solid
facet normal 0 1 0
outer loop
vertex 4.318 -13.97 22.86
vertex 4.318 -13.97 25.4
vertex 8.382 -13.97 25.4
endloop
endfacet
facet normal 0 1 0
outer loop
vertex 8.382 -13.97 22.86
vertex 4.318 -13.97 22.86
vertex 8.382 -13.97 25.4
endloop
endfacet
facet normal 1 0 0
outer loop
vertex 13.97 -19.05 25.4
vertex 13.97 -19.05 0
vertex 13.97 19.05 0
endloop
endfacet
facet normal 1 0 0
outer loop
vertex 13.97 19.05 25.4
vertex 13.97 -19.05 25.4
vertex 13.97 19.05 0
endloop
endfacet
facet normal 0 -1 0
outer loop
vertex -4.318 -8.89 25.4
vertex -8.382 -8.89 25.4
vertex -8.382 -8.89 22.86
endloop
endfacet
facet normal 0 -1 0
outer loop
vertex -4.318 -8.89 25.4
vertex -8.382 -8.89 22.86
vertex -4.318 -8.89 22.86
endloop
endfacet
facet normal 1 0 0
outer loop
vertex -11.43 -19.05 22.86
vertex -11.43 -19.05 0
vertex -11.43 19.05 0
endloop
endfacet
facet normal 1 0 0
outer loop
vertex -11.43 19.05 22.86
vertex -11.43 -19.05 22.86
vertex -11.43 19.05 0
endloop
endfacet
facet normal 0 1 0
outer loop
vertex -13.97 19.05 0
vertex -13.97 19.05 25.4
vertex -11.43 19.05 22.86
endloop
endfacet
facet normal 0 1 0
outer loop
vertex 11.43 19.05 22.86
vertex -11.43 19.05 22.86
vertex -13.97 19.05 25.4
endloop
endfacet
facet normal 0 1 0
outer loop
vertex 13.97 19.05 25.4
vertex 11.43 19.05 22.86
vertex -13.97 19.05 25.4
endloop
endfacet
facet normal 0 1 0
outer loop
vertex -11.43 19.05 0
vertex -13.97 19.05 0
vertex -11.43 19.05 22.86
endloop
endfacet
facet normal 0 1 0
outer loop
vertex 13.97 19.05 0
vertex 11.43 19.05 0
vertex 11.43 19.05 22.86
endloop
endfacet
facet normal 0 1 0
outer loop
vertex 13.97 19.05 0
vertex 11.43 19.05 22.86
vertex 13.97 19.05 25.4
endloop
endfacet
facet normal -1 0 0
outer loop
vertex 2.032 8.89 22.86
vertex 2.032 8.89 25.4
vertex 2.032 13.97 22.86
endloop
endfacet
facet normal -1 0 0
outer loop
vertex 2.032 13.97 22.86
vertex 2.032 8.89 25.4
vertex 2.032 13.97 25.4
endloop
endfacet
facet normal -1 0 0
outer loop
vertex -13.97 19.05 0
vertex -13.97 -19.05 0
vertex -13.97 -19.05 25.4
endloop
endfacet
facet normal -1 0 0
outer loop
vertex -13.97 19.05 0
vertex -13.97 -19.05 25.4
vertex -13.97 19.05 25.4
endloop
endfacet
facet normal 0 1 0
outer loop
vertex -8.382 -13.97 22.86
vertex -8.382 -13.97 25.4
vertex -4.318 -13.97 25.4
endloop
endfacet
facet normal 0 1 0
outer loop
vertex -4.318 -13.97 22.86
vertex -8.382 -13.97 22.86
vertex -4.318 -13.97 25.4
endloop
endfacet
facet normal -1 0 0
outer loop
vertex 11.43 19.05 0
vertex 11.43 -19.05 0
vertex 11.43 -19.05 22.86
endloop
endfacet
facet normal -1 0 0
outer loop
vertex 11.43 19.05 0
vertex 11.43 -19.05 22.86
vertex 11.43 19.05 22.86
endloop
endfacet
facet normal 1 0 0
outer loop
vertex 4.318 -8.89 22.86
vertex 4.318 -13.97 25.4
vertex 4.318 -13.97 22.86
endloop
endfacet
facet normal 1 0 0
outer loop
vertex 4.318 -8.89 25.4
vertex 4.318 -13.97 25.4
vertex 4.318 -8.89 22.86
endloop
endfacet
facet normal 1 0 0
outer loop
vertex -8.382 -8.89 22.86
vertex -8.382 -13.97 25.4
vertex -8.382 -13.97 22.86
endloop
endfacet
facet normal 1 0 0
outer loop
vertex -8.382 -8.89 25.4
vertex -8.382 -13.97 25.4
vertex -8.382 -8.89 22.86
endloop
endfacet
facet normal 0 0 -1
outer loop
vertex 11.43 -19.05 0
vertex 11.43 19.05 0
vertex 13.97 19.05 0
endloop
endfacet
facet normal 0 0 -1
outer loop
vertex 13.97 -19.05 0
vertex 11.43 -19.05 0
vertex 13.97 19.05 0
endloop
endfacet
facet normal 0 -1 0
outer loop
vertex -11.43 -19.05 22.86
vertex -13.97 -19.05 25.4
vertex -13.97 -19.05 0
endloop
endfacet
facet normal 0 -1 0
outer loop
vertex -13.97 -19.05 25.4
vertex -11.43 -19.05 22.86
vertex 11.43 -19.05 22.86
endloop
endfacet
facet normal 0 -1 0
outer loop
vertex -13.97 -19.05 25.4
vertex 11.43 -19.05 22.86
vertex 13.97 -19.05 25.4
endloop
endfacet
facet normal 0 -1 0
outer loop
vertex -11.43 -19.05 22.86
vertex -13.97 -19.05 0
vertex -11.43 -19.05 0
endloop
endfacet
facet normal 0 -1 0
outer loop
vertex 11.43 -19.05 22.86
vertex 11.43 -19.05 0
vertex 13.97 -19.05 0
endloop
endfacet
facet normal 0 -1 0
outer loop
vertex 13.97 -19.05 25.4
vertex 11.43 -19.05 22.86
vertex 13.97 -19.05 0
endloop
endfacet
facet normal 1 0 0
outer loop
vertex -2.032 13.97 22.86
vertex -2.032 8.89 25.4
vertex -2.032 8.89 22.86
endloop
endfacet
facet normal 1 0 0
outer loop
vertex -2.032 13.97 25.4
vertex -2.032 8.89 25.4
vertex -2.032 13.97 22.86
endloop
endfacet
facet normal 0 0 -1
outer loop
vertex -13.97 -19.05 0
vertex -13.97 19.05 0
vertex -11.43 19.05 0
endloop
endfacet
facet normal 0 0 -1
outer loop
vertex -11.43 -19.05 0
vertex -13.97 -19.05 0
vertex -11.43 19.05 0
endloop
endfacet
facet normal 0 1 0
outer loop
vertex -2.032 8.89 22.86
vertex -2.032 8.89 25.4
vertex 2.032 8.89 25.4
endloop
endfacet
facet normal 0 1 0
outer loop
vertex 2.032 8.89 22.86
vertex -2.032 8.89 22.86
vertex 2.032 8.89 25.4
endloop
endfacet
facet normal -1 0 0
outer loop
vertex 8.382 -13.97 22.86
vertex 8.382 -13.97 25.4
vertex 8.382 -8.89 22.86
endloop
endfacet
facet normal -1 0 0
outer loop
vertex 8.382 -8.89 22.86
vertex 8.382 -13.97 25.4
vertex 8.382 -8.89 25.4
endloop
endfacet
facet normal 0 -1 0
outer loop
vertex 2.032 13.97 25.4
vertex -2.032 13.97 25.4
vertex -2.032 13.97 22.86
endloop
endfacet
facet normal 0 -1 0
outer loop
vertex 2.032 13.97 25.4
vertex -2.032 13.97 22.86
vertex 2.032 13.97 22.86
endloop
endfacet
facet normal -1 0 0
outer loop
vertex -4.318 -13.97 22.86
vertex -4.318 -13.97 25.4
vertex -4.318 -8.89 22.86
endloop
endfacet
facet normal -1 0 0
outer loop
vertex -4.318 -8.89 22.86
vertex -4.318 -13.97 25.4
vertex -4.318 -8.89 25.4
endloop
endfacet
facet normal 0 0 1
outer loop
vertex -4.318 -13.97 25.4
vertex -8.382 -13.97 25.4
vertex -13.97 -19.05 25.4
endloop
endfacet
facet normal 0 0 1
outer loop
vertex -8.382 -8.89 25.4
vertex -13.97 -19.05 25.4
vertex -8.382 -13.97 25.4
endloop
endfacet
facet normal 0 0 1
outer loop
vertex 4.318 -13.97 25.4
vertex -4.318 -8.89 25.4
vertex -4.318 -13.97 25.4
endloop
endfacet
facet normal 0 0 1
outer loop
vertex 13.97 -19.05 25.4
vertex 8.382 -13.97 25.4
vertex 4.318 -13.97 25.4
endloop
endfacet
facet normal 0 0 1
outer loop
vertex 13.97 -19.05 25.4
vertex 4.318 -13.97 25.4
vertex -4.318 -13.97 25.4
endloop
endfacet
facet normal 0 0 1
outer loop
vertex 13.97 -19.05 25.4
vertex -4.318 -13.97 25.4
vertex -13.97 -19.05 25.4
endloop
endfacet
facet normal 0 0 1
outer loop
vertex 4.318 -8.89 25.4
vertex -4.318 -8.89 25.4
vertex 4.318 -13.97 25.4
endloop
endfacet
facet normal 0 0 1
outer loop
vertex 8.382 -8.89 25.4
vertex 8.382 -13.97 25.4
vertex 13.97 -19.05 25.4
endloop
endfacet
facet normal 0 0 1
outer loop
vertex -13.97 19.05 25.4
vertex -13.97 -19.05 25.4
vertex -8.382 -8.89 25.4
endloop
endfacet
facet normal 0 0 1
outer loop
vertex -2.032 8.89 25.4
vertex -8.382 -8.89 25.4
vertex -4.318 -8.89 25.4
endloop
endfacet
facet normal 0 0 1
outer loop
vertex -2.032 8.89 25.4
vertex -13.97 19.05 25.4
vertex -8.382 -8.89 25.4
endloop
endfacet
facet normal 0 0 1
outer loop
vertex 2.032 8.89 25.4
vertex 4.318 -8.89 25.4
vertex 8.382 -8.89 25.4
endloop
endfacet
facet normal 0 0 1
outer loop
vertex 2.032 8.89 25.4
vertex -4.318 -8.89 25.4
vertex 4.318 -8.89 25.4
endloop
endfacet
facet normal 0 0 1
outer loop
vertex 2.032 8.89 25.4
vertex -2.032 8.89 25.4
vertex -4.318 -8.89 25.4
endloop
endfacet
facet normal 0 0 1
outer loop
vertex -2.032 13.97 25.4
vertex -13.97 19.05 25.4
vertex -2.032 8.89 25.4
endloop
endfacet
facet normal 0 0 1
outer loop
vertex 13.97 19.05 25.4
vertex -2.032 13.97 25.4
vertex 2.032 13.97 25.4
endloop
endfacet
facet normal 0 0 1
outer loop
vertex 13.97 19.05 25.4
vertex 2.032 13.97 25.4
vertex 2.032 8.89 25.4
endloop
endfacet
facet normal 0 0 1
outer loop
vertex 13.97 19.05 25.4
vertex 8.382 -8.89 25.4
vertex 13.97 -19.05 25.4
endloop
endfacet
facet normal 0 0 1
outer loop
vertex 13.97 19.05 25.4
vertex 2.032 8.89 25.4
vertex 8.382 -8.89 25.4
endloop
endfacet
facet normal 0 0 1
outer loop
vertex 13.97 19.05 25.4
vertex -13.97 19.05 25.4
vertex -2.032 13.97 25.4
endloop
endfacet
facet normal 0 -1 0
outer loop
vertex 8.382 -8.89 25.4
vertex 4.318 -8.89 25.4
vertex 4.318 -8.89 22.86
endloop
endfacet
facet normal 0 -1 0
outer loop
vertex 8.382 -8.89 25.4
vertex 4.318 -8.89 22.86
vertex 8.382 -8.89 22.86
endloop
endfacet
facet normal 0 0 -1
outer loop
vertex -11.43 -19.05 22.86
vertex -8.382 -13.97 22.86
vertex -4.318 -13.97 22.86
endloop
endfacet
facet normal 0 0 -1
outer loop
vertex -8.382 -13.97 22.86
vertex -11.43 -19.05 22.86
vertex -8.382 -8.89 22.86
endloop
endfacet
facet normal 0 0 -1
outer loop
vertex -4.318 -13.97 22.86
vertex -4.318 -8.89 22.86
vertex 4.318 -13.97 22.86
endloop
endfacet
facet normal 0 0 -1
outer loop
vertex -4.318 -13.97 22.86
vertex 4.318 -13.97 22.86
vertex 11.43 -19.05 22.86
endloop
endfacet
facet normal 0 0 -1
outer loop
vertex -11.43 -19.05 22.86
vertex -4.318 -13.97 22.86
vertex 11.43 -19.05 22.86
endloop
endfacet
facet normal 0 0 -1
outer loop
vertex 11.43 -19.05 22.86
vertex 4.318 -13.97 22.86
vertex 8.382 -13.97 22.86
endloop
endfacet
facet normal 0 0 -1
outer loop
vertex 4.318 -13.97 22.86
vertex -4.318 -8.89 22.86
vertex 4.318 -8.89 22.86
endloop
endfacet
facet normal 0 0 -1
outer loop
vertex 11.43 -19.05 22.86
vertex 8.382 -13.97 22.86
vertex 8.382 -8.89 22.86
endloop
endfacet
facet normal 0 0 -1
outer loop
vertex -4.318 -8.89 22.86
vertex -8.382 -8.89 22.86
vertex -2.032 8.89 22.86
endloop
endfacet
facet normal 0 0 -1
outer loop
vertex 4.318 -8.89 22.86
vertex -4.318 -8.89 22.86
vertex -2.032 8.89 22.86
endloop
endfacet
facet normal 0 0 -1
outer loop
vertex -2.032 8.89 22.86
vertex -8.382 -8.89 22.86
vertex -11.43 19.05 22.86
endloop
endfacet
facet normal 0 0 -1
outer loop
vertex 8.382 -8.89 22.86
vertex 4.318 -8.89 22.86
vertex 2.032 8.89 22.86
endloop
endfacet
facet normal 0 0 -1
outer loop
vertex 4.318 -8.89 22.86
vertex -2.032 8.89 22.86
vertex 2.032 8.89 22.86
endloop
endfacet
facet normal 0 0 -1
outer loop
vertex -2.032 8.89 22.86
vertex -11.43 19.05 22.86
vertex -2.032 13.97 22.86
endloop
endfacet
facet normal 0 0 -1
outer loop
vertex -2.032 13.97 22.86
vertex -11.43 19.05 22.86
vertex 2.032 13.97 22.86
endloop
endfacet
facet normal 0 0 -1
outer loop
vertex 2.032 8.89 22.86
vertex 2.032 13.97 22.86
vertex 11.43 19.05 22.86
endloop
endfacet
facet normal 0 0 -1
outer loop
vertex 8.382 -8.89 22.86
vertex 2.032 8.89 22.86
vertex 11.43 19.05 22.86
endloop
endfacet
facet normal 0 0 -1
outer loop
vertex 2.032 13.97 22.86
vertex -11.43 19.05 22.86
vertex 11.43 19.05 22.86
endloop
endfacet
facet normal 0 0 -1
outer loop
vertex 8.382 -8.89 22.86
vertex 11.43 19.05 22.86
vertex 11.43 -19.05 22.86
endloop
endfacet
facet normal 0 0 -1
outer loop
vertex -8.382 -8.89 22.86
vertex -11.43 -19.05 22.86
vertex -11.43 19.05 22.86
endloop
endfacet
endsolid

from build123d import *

# Parameters (mm, degrees)
F0_W     = 27.94
F0_H     = 38.1
F1_DEPTH = 25.4
F3_T     = -2.54
F2_W     = 4.064
F2_H     = 5.08
F4_DEPTH = 25.4


with BuildPart() as f1:
    # F0 (on Top) → F1 (new body)
    with BuildSketch(Plane.XY):
        Rectangle(F0_W, F0_H)
    extrude(amount=F1_DEPTH)

    # F3
    f3_openings = [f1.faces().sort_by_distance(p)[0] for p in [
        (0, -19.05, 12.7),
        (0, 0, 0),
        (0, 19.05, 12.7),
    ]]
    offset(amount=F3_T, openings=f3_openings)

    # F2 (on face) → F4 (cut)
    with BuildSketch(Plane.XY.offset(25.4)):
        with Locations((0, 11.43)):
            Rectangle(F2_W, F2_H)
        with Locations((-6.35, -11.43)):
            Rectangle(F2_W, F2_H)
        with Locations((6.35, -11.43)):
            Rectangle(F2_W, F2_H)
    extrude(amount=-F4_DEPTH, mode=Mode.SUBTRACT)


solid = f1.part
